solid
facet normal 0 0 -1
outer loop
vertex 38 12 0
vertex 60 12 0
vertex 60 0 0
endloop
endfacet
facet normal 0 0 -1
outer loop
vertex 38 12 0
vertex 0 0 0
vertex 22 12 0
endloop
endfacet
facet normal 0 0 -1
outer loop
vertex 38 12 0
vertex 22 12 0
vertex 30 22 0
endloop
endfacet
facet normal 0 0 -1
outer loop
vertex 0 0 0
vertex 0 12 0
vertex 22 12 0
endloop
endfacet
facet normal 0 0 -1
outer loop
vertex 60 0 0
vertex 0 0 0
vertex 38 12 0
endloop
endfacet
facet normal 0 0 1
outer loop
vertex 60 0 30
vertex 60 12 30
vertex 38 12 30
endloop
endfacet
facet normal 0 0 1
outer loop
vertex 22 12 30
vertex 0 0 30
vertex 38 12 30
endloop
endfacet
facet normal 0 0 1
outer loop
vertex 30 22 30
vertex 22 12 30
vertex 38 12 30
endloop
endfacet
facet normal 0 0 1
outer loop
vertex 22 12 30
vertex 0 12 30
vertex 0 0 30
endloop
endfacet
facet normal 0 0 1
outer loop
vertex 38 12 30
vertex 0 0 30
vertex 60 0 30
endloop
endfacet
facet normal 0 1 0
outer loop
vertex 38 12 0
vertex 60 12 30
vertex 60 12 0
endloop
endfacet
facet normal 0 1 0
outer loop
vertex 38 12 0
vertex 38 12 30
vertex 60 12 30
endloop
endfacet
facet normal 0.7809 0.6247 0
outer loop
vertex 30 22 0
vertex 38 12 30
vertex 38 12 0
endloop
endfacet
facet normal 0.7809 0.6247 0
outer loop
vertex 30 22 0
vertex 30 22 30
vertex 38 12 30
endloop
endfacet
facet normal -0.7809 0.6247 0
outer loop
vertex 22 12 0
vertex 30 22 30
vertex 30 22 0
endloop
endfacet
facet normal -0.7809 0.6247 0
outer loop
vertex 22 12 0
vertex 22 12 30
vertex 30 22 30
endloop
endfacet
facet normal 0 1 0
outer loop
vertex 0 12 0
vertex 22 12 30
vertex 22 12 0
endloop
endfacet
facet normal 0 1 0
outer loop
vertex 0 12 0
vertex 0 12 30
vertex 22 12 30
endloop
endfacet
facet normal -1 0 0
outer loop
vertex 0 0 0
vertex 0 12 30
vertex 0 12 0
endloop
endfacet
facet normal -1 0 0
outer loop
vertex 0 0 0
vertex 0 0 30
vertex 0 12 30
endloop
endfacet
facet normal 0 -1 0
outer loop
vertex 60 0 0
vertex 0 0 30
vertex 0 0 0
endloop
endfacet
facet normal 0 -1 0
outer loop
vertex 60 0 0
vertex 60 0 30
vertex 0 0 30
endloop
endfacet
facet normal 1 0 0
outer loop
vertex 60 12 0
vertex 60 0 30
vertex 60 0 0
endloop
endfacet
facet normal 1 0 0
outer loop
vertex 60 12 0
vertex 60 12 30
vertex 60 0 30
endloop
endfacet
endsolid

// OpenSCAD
$fn = 32;

// ----------------------------------------------------------------------
// V guide rail: vrib, 60 mm wide
// ----------------------------------------------------------------------

// --- parameters (mm) ---
rail_w = 60;              // rail width, X
base_t = 12;              // base plate thickness
v_depth = 10;             // V feature depth / height
v_half_w = 8;             // half width of the V at the base face
plate_t = 30;             // rail length, Z (the extrusion height)

profile = [[0, 0], [60, 0], [60, 12], [38, 12], [30, 22], [22, 12], [0, 12]];  // primary outline, 7 points, counter clockwise

// --- the one profile operation ---
linear_extrude(height = plate_t) polygon(points = profile);
